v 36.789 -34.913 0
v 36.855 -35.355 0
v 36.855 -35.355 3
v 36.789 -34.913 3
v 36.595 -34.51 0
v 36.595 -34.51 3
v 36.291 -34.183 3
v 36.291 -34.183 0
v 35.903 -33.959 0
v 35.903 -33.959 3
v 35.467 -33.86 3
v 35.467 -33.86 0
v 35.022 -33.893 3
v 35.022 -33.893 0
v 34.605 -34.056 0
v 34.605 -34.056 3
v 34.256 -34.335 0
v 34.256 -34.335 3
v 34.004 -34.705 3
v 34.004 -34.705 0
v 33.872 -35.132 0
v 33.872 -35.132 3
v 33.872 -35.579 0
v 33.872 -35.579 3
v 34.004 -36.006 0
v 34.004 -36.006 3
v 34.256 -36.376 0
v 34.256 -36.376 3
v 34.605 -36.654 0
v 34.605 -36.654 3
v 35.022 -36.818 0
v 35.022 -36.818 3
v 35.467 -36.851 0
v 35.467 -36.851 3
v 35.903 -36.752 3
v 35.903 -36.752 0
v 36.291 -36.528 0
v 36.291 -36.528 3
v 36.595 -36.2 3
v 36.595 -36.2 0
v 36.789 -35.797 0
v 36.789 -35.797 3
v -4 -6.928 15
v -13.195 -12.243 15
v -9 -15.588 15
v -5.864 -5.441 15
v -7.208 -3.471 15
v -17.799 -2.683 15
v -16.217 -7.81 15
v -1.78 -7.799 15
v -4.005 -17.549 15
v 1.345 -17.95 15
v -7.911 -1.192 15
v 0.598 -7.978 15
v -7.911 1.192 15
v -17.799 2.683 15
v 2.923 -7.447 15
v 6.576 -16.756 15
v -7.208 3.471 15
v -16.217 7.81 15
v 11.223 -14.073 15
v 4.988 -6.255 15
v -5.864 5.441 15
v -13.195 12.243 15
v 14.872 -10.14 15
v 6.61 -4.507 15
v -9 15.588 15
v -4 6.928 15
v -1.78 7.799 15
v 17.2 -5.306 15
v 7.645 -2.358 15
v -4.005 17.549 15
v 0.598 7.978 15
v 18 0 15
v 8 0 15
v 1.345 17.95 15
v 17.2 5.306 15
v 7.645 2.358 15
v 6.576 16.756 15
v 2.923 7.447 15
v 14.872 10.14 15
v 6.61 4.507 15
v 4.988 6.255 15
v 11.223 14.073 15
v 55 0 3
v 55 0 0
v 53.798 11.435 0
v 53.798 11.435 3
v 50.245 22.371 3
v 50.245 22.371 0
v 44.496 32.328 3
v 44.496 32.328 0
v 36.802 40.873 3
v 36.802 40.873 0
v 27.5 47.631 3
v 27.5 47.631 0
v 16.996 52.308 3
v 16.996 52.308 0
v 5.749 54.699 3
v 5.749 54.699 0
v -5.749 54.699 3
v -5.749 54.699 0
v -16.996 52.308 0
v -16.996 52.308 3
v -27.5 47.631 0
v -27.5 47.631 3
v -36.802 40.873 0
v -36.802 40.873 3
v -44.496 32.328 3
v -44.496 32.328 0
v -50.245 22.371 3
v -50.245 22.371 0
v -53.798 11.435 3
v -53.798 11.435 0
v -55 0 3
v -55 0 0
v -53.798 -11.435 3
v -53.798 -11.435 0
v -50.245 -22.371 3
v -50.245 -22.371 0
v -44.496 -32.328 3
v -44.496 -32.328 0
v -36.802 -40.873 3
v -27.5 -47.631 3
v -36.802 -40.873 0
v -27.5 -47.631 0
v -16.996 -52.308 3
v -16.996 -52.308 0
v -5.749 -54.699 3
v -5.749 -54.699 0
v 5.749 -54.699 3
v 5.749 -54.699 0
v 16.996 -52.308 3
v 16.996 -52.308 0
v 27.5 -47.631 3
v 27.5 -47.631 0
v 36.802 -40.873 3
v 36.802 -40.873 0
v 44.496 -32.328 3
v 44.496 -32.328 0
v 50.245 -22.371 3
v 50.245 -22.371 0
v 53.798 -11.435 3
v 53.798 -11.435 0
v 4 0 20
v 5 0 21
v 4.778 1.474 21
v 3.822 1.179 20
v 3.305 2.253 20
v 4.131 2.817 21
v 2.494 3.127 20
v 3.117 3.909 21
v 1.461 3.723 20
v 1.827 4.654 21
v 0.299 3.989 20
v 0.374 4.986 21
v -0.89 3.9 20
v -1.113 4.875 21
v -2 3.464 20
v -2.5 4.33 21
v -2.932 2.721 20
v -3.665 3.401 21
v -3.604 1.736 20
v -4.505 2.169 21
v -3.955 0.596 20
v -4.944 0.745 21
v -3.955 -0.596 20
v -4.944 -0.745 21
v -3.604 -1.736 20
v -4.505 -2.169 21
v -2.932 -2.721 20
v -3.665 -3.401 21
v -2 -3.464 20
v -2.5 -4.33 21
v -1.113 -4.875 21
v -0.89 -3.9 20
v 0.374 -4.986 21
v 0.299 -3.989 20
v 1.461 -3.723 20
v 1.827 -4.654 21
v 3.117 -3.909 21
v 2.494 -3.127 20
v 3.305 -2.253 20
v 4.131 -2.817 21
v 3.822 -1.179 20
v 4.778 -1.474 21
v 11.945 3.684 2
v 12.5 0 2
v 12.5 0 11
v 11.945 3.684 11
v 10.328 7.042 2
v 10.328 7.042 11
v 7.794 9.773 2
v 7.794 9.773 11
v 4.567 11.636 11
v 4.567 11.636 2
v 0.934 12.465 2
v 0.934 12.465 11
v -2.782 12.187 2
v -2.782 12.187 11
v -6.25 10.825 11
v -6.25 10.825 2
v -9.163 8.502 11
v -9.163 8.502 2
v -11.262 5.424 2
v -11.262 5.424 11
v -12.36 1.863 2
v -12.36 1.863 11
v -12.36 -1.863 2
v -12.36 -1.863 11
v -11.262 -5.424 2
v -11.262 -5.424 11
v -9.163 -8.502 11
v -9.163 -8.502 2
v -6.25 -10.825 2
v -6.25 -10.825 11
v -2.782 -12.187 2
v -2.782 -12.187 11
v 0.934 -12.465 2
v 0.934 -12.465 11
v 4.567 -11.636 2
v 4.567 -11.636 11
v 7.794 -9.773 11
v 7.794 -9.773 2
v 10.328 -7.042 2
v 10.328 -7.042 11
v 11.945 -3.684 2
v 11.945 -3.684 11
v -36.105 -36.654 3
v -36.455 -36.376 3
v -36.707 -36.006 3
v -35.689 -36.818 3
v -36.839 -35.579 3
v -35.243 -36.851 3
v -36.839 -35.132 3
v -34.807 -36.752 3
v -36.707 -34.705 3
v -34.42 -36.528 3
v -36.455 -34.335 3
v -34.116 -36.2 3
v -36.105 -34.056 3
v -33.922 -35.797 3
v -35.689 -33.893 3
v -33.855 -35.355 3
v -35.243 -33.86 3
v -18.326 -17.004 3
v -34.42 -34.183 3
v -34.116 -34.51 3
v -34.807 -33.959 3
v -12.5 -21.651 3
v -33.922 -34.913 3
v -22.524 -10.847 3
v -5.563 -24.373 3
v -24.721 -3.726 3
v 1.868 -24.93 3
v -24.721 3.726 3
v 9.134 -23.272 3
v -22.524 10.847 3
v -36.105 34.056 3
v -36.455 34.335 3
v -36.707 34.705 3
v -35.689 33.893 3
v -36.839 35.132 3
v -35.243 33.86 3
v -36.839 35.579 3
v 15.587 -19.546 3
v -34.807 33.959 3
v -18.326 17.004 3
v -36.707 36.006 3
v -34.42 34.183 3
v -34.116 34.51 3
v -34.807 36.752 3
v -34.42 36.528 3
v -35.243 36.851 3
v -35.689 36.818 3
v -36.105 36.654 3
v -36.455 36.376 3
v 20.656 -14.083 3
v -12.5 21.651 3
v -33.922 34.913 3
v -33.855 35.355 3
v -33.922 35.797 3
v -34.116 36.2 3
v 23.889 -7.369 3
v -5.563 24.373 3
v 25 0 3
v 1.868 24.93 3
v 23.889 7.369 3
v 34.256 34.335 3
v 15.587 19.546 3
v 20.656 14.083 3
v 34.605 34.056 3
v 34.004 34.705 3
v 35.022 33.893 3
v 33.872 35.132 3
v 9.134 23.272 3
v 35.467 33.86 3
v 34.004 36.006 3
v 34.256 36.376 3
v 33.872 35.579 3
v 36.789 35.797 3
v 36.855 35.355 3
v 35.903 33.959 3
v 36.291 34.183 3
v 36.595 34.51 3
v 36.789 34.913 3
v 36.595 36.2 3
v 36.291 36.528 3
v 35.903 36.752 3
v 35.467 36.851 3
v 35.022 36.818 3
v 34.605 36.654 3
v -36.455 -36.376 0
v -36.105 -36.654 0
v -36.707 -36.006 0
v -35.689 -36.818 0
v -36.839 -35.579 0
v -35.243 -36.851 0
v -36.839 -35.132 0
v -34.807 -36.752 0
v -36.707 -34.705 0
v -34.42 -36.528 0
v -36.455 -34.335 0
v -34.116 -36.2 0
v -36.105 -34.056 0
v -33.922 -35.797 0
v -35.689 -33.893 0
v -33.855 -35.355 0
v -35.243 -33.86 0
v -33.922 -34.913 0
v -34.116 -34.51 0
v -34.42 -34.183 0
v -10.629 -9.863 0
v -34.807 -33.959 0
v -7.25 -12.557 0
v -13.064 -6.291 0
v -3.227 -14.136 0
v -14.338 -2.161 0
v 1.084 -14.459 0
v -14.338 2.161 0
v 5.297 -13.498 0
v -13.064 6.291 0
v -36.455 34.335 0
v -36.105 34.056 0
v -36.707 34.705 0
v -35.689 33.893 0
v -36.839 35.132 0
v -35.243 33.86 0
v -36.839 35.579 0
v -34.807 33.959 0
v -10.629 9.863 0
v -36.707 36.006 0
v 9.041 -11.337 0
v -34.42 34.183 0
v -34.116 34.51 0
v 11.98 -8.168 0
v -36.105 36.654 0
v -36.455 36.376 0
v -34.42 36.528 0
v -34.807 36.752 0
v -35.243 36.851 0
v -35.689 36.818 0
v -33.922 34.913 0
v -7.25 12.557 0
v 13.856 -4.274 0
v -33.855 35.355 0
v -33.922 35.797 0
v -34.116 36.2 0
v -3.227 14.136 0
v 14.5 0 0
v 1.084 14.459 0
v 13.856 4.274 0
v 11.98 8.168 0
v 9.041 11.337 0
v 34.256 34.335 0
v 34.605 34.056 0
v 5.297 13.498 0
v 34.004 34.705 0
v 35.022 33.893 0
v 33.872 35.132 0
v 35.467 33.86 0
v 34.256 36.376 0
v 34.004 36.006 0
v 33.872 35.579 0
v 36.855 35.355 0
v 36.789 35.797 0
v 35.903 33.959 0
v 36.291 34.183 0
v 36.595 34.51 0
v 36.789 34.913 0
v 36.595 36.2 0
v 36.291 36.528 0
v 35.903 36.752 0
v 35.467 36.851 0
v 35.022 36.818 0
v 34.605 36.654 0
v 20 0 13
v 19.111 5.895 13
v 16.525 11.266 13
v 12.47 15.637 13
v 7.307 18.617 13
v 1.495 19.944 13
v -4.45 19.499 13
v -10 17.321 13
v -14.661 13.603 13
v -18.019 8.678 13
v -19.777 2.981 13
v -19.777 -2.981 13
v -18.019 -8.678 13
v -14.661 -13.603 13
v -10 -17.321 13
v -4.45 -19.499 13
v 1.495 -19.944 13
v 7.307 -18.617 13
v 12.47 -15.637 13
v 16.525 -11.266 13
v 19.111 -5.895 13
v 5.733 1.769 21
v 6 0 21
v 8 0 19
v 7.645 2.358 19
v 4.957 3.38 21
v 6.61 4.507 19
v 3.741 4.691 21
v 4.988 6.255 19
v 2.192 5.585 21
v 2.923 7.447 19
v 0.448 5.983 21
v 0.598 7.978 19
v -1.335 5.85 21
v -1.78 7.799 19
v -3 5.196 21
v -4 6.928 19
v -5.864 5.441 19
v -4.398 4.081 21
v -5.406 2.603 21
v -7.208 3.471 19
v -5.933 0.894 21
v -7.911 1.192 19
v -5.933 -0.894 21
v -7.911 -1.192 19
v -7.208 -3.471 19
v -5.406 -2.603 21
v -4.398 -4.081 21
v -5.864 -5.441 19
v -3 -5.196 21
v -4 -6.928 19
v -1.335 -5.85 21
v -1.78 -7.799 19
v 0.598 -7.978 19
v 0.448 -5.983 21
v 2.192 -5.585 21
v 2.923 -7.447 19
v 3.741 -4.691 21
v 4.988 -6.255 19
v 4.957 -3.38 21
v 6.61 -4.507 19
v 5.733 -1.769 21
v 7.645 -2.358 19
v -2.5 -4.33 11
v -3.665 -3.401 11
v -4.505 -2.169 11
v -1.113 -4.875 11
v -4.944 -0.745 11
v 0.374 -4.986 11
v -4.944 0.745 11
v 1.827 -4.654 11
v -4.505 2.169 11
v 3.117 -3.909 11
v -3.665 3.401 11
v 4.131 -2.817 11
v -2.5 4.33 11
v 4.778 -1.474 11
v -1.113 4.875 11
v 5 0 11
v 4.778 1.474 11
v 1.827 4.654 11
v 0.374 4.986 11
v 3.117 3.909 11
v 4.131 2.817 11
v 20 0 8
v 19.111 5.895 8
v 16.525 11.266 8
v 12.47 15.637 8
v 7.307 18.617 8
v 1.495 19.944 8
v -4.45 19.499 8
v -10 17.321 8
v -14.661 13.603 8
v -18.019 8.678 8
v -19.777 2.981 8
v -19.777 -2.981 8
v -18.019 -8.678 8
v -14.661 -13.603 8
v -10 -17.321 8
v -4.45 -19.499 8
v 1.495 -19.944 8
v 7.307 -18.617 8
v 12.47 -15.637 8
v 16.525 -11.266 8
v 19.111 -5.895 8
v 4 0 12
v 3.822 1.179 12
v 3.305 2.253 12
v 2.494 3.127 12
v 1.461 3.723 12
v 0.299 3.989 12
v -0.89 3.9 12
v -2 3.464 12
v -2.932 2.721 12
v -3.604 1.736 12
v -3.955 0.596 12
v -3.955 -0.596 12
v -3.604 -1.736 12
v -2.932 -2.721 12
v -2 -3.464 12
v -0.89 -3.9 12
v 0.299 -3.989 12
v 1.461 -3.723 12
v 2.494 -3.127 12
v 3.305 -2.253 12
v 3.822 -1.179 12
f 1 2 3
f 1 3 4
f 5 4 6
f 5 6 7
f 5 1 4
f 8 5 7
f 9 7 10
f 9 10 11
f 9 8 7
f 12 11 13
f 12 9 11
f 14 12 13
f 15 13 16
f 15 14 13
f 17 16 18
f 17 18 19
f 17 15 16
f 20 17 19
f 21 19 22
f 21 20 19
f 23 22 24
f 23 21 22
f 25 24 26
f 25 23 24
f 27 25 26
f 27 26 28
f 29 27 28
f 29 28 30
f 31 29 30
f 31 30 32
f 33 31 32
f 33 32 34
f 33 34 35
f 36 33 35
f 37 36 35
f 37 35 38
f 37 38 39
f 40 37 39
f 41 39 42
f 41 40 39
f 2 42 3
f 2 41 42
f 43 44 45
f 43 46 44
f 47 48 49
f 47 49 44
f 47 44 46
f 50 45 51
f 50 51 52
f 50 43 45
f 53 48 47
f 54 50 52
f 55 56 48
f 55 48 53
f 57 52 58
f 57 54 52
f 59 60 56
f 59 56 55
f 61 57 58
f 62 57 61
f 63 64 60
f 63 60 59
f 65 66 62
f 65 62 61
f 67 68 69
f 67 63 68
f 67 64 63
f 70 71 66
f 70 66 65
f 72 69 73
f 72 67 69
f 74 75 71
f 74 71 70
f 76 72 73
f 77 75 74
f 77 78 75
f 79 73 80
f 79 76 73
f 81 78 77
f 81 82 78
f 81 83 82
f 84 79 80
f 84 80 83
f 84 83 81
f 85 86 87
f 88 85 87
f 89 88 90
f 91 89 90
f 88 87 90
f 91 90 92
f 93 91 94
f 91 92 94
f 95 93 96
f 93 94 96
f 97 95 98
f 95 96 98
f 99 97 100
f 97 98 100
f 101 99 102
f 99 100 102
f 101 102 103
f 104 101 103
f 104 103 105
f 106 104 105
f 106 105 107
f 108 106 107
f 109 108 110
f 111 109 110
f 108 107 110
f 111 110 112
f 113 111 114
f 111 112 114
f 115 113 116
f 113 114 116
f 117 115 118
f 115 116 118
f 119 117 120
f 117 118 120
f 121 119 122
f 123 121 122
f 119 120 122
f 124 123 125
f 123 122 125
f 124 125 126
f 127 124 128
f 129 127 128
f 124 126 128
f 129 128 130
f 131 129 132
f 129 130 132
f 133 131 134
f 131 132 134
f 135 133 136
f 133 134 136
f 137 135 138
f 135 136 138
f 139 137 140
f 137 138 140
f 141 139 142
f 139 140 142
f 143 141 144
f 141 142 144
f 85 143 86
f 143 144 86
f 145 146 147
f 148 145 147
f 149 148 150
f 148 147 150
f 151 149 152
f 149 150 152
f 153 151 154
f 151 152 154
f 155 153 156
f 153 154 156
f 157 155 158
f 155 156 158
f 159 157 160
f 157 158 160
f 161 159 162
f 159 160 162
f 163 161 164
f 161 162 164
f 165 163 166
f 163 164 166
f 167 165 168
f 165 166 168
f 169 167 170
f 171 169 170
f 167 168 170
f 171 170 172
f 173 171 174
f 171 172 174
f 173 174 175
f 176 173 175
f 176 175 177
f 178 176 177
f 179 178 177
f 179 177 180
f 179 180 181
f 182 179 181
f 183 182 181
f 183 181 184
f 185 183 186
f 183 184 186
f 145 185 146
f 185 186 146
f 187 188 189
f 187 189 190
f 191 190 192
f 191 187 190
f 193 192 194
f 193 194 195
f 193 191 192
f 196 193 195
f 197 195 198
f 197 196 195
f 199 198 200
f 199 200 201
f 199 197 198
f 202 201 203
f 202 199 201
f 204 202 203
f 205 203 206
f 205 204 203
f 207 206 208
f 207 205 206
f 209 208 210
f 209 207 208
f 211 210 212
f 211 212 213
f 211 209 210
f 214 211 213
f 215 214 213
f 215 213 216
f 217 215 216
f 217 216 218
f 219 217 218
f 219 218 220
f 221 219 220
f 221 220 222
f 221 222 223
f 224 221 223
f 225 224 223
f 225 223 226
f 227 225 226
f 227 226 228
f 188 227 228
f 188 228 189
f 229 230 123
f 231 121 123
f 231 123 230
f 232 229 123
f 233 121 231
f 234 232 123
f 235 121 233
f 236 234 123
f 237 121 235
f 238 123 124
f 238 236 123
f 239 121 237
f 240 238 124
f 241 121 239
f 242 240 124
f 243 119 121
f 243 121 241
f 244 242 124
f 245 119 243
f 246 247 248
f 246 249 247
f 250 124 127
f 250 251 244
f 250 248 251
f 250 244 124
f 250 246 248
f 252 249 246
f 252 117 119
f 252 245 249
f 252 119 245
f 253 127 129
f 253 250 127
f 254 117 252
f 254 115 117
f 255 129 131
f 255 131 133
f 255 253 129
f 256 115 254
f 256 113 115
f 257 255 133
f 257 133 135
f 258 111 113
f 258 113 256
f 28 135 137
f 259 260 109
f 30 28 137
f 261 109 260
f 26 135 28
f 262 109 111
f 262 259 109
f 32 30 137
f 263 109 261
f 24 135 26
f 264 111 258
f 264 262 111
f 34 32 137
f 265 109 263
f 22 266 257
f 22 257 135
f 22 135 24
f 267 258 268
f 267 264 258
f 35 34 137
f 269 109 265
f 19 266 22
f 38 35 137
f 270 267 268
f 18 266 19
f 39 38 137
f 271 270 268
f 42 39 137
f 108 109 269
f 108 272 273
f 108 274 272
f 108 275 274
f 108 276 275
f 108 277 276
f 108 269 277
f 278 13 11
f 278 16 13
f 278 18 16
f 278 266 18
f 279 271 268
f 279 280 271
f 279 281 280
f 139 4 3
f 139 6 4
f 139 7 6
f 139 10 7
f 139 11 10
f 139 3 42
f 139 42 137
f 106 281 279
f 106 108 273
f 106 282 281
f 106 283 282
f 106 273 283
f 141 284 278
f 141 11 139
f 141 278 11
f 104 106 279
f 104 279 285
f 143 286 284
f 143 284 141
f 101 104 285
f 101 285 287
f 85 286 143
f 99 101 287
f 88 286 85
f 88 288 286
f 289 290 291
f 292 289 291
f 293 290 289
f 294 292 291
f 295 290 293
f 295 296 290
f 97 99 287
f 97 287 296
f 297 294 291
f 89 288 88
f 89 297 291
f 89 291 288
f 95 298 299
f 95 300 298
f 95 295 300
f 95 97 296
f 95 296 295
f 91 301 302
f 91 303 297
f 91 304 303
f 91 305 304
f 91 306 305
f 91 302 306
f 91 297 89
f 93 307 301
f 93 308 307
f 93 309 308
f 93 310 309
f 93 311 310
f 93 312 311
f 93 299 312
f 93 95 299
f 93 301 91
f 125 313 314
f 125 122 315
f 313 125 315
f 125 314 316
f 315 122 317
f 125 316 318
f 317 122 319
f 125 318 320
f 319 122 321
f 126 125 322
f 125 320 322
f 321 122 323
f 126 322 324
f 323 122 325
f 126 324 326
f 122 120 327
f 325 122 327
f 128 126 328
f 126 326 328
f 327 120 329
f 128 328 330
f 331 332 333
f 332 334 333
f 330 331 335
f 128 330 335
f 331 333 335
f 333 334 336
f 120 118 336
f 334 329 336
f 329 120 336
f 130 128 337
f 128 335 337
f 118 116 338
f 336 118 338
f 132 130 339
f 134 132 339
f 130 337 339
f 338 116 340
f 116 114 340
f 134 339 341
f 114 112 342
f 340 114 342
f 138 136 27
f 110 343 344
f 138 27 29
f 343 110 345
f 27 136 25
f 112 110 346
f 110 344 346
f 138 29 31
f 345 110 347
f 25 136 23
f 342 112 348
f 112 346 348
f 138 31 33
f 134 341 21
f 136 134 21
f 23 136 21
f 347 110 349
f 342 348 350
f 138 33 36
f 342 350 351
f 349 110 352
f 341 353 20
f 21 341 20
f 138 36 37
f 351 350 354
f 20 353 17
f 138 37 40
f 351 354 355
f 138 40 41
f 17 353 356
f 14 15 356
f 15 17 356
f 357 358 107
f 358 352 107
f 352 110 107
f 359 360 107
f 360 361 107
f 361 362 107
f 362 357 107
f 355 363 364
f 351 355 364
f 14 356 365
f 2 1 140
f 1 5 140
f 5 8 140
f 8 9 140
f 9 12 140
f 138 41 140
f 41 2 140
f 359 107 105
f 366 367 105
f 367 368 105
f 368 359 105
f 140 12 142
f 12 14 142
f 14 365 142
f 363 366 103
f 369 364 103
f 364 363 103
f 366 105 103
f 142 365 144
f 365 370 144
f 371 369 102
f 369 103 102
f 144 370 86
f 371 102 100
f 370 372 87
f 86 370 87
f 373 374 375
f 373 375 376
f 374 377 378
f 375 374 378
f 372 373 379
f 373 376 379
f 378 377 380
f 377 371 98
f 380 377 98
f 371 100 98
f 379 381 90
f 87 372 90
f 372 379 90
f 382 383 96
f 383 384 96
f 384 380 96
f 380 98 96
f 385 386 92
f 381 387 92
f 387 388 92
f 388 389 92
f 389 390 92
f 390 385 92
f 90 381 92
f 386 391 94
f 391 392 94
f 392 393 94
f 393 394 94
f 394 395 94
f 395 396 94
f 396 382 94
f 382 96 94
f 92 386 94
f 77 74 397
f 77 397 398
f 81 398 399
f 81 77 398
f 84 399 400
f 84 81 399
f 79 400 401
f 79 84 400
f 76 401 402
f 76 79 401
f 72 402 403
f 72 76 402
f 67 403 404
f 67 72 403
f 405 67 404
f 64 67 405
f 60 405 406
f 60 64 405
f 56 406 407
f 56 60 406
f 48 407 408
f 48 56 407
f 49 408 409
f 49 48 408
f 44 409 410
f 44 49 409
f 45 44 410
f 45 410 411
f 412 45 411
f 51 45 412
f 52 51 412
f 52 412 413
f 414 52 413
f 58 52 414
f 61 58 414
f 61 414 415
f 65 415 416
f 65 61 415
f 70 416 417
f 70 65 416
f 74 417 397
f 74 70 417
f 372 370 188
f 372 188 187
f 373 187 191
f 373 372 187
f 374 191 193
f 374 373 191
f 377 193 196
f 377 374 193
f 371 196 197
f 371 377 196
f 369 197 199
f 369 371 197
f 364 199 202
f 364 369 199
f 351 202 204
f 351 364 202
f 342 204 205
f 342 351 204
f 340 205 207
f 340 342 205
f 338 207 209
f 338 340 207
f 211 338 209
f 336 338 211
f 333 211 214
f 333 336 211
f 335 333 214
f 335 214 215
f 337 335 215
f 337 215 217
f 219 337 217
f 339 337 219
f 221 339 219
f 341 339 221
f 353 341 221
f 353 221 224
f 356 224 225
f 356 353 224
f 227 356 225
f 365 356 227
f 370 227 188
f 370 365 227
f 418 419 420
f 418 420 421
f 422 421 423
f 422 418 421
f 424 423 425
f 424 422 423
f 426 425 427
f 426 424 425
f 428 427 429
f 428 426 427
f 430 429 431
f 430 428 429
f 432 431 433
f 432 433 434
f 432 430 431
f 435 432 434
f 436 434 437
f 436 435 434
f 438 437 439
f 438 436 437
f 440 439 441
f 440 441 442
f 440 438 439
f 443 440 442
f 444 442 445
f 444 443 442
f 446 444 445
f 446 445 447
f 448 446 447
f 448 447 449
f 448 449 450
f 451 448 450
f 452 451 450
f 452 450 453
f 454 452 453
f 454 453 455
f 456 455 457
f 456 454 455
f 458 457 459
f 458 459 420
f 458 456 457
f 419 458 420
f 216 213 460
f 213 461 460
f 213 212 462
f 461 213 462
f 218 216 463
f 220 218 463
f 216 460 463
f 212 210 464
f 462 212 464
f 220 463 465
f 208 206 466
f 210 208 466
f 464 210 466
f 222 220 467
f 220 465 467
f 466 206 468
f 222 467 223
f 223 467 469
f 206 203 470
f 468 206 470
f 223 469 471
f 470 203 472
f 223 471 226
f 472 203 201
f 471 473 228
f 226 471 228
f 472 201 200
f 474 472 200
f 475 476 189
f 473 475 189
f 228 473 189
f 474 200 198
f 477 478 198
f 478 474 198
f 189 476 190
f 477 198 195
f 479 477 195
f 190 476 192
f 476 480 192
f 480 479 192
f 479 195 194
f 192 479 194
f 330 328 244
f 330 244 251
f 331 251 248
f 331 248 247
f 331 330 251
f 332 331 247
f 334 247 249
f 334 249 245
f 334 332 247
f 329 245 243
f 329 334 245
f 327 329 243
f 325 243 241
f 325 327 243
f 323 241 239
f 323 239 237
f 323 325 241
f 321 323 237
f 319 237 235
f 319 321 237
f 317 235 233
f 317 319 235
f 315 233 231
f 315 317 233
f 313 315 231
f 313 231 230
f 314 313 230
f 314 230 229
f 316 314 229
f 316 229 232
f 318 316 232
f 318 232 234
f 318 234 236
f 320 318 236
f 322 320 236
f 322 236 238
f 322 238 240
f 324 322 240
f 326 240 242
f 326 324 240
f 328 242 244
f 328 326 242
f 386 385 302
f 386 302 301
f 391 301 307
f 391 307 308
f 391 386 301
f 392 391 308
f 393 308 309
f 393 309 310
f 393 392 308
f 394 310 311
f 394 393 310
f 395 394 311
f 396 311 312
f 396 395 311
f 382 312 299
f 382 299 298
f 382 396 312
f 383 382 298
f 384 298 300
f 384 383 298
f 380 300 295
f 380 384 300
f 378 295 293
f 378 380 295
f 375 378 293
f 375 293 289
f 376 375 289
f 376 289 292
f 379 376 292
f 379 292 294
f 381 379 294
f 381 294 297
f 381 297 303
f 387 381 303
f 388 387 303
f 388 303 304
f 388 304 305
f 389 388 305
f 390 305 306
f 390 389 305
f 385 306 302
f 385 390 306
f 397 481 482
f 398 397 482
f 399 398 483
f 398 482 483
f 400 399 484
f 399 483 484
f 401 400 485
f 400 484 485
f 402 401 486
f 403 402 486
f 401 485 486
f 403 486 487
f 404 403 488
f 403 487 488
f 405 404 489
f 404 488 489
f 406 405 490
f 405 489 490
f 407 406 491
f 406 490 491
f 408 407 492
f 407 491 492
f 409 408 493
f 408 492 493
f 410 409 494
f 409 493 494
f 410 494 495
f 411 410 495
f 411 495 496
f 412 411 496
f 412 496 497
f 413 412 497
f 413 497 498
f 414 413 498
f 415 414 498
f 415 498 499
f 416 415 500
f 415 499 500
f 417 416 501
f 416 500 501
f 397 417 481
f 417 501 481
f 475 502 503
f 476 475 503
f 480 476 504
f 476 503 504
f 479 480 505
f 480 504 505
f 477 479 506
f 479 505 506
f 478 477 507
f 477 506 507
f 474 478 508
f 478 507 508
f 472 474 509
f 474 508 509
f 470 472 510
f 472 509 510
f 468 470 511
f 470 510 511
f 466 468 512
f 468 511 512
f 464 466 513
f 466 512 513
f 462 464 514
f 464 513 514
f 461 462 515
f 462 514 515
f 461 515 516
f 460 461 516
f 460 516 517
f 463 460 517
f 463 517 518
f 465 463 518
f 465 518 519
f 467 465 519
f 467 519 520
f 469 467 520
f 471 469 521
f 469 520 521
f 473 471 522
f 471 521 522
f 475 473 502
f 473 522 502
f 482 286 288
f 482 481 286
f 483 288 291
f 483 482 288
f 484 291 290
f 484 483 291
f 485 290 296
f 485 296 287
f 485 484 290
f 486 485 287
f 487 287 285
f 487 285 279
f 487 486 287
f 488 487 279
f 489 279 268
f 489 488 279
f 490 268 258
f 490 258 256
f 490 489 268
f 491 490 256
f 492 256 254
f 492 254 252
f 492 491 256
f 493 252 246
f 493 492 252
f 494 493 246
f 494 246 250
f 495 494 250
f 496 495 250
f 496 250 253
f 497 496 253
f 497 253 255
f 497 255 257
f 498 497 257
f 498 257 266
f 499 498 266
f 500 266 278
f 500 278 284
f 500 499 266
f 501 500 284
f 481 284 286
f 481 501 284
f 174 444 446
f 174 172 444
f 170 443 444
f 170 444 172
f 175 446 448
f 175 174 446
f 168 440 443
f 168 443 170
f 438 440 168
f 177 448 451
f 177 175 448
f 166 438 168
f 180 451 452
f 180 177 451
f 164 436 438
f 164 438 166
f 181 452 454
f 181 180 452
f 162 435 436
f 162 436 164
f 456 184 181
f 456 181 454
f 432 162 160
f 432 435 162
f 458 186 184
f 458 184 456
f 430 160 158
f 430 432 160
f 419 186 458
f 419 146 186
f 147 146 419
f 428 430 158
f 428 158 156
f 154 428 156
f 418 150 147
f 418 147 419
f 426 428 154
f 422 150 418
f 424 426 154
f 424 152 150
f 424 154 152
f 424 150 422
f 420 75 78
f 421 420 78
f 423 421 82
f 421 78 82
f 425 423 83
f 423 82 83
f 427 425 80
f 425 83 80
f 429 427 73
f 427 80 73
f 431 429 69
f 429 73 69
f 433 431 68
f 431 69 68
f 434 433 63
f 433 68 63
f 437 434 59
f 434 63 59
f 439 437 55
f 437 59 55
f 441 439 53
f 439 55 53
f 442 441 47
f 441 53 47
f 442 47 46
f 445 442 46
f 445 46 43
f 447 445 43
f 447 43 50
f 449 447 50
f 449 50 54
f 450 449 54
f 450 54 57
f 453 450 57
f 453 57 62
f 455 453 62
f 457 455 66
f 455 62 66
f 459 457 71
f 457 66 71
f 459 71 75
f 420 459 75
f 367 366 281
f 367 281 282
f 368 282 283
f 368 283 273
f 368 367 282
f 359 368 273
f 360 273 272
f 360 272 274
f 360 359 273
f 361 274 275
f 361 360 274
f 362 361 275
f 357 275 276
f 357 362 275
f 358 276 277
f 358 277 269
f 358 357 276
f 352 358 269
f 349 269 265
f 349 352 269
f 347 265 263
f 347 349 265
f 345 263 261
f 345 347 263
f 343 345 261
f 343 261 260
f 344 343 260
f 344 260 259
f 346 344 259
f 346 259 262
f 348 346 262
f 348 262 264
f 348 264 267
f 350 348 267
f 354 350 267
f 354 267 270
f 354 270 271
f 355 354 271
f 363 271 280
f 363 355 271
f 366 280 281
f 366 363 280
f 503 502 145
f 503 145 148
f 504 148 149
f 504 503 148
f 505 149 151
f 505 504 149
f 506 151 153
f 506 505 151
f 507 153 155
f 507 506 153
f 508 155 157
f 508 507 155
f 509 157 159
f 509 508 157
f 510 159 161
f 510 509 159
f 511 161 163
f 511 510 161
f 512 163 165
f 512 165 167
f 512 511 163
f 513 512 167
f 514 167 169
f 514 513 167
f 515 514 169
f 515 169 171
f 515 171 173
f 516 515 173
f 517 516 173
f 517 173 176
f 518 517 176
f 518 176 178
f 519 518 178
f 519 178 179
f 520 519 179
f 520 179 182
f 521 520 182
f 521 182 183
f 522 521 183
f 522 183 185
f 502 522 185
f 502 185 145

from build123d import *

# Parameters (mm, degrees)
SKETCH_R        = 55
SKETCH_R_2      = 12.5
SKETCH_R_3      = 1.5
PAD_DEPTH       = 3
SKETCH001_R     = 20
SKETCH001_R_2   = 12.5
PAD001_DEPTH    = 8
SKETCH002_R     = 20
SKETCH002_R_2   = 4
PAD002_DEPTH    = 4
SKETCH003_R     = 8
SKETCH003_R_2   = 4
PAD003_DEPTH    = 6
CHAMFER_SIZE    = 2
CHAMFER001_SIZE = 2
CHAMFER002_SIZE = 2
CHAMFER003_SIZE = 1
CHAMFER004_SIZE = 1


with BuildPart() as part:
    # Sketch → Pad (new body)
    with BuildSketch(Plane.XY):
        Circle(SKETCH_R)
        Circle(SKETCH_R_2, mode=Mode.SUBTRACT)
        with Locations((35.355339, 35.355339)):
            Circle(SKETCH_R_3, mode=Mode.SUBTRACT)
        with Locations((-35.355339, 35.355339)):
            Circle(SKETCH_R_3, mode=Mode.SUBTRACT)
        with Locations((-35.355339, -35.355339)):
            Circle(SKETCH_R_3, mode=Mode.SUBTRACT)
        with Locations((35.355339, -35.355339)):
            Circle(SKETCH_R_3, mode=Mode.SUBTRACT)
    extrude(amount=PAD_DEPTH)

    # Sketch001 (on Face8 of Pad) → Pad001 (join)
    with BuildSketch(Plane.XY.offset(3)):
        Circle(SKETCH001_R)
        Circle(SKETCH001_R_2, mode=Mode.SUBTRACT)
    extrude(amount=PAD001_DEPTH)

    # Sketch002 (on Face11 of Pad001) → Pad002 (join)
    with BuildSketch(Plane.XY.offset(11)):
        Circle(SKETCH002_R)
        Circle(SKETCH002_R_2, mode=Mode.SUBTRACT)
    extrude(amount=PAD002_DEPTH)

    # Sketch003 (on Face13 of Pad002) → Pad003 (join)
    with BuildSketch(Plane.XY.offset(15)):
        Circle(SKETCH003_R)
        Circle(SKETCH003_R_2, mode=Mode.SUBTRACT)
    extrude(amount=PAD003_DEPTH)

    # Sketch004 → Revolution (revolve)
    with BuildSketch(Plane.XZ):
        Polygon((25, 3), (20, 8), (20, 3), align=None)
    revolve(axis=Axis((0, 0, 0), (0, 0, 1)))

    # Chamfer
    chamfer_edges = [part.edges().sort_by_distance(p)[0] for p in [
        (-20, 0, 15),
    ]]
    chamfer(chamfer_edges, length=CHAMFER_SIZE)

    # Chamfer001
    chamfer001_edges = [part.edges().sort_by_distance(p)[0] for p in [
        (-8, 0, 21),
    ]]
    chamfer(chamfer001_edges, length=CHAMFER001_SIZE)

    # Chamfer002
    chamfer002_edges = [part.edges().sort_by_distance(p)[0] for p in [
        (-12.5, 0, 0),
    ]]
    chamfer(chamfer002_edges, length=CHAMFER002_SIZE)

    # Chamfer003
    chamfer003_edges = [part.edges().sort_by_distance(p)[0] for p in [
        (-4, 0, 11),
    ]]
    chamfer(chamfer003_edges, length=CHAMFER003_SIZE)

    # Chamfer004
    chamfer004_edges = [part.edges().sort_by_distance(p)[0] for p in [
        (-4, 0, 21),
    ]]
    chamfer(chamfer004_edges, length=CHAMFER004_SIZE)


solid = part.part
